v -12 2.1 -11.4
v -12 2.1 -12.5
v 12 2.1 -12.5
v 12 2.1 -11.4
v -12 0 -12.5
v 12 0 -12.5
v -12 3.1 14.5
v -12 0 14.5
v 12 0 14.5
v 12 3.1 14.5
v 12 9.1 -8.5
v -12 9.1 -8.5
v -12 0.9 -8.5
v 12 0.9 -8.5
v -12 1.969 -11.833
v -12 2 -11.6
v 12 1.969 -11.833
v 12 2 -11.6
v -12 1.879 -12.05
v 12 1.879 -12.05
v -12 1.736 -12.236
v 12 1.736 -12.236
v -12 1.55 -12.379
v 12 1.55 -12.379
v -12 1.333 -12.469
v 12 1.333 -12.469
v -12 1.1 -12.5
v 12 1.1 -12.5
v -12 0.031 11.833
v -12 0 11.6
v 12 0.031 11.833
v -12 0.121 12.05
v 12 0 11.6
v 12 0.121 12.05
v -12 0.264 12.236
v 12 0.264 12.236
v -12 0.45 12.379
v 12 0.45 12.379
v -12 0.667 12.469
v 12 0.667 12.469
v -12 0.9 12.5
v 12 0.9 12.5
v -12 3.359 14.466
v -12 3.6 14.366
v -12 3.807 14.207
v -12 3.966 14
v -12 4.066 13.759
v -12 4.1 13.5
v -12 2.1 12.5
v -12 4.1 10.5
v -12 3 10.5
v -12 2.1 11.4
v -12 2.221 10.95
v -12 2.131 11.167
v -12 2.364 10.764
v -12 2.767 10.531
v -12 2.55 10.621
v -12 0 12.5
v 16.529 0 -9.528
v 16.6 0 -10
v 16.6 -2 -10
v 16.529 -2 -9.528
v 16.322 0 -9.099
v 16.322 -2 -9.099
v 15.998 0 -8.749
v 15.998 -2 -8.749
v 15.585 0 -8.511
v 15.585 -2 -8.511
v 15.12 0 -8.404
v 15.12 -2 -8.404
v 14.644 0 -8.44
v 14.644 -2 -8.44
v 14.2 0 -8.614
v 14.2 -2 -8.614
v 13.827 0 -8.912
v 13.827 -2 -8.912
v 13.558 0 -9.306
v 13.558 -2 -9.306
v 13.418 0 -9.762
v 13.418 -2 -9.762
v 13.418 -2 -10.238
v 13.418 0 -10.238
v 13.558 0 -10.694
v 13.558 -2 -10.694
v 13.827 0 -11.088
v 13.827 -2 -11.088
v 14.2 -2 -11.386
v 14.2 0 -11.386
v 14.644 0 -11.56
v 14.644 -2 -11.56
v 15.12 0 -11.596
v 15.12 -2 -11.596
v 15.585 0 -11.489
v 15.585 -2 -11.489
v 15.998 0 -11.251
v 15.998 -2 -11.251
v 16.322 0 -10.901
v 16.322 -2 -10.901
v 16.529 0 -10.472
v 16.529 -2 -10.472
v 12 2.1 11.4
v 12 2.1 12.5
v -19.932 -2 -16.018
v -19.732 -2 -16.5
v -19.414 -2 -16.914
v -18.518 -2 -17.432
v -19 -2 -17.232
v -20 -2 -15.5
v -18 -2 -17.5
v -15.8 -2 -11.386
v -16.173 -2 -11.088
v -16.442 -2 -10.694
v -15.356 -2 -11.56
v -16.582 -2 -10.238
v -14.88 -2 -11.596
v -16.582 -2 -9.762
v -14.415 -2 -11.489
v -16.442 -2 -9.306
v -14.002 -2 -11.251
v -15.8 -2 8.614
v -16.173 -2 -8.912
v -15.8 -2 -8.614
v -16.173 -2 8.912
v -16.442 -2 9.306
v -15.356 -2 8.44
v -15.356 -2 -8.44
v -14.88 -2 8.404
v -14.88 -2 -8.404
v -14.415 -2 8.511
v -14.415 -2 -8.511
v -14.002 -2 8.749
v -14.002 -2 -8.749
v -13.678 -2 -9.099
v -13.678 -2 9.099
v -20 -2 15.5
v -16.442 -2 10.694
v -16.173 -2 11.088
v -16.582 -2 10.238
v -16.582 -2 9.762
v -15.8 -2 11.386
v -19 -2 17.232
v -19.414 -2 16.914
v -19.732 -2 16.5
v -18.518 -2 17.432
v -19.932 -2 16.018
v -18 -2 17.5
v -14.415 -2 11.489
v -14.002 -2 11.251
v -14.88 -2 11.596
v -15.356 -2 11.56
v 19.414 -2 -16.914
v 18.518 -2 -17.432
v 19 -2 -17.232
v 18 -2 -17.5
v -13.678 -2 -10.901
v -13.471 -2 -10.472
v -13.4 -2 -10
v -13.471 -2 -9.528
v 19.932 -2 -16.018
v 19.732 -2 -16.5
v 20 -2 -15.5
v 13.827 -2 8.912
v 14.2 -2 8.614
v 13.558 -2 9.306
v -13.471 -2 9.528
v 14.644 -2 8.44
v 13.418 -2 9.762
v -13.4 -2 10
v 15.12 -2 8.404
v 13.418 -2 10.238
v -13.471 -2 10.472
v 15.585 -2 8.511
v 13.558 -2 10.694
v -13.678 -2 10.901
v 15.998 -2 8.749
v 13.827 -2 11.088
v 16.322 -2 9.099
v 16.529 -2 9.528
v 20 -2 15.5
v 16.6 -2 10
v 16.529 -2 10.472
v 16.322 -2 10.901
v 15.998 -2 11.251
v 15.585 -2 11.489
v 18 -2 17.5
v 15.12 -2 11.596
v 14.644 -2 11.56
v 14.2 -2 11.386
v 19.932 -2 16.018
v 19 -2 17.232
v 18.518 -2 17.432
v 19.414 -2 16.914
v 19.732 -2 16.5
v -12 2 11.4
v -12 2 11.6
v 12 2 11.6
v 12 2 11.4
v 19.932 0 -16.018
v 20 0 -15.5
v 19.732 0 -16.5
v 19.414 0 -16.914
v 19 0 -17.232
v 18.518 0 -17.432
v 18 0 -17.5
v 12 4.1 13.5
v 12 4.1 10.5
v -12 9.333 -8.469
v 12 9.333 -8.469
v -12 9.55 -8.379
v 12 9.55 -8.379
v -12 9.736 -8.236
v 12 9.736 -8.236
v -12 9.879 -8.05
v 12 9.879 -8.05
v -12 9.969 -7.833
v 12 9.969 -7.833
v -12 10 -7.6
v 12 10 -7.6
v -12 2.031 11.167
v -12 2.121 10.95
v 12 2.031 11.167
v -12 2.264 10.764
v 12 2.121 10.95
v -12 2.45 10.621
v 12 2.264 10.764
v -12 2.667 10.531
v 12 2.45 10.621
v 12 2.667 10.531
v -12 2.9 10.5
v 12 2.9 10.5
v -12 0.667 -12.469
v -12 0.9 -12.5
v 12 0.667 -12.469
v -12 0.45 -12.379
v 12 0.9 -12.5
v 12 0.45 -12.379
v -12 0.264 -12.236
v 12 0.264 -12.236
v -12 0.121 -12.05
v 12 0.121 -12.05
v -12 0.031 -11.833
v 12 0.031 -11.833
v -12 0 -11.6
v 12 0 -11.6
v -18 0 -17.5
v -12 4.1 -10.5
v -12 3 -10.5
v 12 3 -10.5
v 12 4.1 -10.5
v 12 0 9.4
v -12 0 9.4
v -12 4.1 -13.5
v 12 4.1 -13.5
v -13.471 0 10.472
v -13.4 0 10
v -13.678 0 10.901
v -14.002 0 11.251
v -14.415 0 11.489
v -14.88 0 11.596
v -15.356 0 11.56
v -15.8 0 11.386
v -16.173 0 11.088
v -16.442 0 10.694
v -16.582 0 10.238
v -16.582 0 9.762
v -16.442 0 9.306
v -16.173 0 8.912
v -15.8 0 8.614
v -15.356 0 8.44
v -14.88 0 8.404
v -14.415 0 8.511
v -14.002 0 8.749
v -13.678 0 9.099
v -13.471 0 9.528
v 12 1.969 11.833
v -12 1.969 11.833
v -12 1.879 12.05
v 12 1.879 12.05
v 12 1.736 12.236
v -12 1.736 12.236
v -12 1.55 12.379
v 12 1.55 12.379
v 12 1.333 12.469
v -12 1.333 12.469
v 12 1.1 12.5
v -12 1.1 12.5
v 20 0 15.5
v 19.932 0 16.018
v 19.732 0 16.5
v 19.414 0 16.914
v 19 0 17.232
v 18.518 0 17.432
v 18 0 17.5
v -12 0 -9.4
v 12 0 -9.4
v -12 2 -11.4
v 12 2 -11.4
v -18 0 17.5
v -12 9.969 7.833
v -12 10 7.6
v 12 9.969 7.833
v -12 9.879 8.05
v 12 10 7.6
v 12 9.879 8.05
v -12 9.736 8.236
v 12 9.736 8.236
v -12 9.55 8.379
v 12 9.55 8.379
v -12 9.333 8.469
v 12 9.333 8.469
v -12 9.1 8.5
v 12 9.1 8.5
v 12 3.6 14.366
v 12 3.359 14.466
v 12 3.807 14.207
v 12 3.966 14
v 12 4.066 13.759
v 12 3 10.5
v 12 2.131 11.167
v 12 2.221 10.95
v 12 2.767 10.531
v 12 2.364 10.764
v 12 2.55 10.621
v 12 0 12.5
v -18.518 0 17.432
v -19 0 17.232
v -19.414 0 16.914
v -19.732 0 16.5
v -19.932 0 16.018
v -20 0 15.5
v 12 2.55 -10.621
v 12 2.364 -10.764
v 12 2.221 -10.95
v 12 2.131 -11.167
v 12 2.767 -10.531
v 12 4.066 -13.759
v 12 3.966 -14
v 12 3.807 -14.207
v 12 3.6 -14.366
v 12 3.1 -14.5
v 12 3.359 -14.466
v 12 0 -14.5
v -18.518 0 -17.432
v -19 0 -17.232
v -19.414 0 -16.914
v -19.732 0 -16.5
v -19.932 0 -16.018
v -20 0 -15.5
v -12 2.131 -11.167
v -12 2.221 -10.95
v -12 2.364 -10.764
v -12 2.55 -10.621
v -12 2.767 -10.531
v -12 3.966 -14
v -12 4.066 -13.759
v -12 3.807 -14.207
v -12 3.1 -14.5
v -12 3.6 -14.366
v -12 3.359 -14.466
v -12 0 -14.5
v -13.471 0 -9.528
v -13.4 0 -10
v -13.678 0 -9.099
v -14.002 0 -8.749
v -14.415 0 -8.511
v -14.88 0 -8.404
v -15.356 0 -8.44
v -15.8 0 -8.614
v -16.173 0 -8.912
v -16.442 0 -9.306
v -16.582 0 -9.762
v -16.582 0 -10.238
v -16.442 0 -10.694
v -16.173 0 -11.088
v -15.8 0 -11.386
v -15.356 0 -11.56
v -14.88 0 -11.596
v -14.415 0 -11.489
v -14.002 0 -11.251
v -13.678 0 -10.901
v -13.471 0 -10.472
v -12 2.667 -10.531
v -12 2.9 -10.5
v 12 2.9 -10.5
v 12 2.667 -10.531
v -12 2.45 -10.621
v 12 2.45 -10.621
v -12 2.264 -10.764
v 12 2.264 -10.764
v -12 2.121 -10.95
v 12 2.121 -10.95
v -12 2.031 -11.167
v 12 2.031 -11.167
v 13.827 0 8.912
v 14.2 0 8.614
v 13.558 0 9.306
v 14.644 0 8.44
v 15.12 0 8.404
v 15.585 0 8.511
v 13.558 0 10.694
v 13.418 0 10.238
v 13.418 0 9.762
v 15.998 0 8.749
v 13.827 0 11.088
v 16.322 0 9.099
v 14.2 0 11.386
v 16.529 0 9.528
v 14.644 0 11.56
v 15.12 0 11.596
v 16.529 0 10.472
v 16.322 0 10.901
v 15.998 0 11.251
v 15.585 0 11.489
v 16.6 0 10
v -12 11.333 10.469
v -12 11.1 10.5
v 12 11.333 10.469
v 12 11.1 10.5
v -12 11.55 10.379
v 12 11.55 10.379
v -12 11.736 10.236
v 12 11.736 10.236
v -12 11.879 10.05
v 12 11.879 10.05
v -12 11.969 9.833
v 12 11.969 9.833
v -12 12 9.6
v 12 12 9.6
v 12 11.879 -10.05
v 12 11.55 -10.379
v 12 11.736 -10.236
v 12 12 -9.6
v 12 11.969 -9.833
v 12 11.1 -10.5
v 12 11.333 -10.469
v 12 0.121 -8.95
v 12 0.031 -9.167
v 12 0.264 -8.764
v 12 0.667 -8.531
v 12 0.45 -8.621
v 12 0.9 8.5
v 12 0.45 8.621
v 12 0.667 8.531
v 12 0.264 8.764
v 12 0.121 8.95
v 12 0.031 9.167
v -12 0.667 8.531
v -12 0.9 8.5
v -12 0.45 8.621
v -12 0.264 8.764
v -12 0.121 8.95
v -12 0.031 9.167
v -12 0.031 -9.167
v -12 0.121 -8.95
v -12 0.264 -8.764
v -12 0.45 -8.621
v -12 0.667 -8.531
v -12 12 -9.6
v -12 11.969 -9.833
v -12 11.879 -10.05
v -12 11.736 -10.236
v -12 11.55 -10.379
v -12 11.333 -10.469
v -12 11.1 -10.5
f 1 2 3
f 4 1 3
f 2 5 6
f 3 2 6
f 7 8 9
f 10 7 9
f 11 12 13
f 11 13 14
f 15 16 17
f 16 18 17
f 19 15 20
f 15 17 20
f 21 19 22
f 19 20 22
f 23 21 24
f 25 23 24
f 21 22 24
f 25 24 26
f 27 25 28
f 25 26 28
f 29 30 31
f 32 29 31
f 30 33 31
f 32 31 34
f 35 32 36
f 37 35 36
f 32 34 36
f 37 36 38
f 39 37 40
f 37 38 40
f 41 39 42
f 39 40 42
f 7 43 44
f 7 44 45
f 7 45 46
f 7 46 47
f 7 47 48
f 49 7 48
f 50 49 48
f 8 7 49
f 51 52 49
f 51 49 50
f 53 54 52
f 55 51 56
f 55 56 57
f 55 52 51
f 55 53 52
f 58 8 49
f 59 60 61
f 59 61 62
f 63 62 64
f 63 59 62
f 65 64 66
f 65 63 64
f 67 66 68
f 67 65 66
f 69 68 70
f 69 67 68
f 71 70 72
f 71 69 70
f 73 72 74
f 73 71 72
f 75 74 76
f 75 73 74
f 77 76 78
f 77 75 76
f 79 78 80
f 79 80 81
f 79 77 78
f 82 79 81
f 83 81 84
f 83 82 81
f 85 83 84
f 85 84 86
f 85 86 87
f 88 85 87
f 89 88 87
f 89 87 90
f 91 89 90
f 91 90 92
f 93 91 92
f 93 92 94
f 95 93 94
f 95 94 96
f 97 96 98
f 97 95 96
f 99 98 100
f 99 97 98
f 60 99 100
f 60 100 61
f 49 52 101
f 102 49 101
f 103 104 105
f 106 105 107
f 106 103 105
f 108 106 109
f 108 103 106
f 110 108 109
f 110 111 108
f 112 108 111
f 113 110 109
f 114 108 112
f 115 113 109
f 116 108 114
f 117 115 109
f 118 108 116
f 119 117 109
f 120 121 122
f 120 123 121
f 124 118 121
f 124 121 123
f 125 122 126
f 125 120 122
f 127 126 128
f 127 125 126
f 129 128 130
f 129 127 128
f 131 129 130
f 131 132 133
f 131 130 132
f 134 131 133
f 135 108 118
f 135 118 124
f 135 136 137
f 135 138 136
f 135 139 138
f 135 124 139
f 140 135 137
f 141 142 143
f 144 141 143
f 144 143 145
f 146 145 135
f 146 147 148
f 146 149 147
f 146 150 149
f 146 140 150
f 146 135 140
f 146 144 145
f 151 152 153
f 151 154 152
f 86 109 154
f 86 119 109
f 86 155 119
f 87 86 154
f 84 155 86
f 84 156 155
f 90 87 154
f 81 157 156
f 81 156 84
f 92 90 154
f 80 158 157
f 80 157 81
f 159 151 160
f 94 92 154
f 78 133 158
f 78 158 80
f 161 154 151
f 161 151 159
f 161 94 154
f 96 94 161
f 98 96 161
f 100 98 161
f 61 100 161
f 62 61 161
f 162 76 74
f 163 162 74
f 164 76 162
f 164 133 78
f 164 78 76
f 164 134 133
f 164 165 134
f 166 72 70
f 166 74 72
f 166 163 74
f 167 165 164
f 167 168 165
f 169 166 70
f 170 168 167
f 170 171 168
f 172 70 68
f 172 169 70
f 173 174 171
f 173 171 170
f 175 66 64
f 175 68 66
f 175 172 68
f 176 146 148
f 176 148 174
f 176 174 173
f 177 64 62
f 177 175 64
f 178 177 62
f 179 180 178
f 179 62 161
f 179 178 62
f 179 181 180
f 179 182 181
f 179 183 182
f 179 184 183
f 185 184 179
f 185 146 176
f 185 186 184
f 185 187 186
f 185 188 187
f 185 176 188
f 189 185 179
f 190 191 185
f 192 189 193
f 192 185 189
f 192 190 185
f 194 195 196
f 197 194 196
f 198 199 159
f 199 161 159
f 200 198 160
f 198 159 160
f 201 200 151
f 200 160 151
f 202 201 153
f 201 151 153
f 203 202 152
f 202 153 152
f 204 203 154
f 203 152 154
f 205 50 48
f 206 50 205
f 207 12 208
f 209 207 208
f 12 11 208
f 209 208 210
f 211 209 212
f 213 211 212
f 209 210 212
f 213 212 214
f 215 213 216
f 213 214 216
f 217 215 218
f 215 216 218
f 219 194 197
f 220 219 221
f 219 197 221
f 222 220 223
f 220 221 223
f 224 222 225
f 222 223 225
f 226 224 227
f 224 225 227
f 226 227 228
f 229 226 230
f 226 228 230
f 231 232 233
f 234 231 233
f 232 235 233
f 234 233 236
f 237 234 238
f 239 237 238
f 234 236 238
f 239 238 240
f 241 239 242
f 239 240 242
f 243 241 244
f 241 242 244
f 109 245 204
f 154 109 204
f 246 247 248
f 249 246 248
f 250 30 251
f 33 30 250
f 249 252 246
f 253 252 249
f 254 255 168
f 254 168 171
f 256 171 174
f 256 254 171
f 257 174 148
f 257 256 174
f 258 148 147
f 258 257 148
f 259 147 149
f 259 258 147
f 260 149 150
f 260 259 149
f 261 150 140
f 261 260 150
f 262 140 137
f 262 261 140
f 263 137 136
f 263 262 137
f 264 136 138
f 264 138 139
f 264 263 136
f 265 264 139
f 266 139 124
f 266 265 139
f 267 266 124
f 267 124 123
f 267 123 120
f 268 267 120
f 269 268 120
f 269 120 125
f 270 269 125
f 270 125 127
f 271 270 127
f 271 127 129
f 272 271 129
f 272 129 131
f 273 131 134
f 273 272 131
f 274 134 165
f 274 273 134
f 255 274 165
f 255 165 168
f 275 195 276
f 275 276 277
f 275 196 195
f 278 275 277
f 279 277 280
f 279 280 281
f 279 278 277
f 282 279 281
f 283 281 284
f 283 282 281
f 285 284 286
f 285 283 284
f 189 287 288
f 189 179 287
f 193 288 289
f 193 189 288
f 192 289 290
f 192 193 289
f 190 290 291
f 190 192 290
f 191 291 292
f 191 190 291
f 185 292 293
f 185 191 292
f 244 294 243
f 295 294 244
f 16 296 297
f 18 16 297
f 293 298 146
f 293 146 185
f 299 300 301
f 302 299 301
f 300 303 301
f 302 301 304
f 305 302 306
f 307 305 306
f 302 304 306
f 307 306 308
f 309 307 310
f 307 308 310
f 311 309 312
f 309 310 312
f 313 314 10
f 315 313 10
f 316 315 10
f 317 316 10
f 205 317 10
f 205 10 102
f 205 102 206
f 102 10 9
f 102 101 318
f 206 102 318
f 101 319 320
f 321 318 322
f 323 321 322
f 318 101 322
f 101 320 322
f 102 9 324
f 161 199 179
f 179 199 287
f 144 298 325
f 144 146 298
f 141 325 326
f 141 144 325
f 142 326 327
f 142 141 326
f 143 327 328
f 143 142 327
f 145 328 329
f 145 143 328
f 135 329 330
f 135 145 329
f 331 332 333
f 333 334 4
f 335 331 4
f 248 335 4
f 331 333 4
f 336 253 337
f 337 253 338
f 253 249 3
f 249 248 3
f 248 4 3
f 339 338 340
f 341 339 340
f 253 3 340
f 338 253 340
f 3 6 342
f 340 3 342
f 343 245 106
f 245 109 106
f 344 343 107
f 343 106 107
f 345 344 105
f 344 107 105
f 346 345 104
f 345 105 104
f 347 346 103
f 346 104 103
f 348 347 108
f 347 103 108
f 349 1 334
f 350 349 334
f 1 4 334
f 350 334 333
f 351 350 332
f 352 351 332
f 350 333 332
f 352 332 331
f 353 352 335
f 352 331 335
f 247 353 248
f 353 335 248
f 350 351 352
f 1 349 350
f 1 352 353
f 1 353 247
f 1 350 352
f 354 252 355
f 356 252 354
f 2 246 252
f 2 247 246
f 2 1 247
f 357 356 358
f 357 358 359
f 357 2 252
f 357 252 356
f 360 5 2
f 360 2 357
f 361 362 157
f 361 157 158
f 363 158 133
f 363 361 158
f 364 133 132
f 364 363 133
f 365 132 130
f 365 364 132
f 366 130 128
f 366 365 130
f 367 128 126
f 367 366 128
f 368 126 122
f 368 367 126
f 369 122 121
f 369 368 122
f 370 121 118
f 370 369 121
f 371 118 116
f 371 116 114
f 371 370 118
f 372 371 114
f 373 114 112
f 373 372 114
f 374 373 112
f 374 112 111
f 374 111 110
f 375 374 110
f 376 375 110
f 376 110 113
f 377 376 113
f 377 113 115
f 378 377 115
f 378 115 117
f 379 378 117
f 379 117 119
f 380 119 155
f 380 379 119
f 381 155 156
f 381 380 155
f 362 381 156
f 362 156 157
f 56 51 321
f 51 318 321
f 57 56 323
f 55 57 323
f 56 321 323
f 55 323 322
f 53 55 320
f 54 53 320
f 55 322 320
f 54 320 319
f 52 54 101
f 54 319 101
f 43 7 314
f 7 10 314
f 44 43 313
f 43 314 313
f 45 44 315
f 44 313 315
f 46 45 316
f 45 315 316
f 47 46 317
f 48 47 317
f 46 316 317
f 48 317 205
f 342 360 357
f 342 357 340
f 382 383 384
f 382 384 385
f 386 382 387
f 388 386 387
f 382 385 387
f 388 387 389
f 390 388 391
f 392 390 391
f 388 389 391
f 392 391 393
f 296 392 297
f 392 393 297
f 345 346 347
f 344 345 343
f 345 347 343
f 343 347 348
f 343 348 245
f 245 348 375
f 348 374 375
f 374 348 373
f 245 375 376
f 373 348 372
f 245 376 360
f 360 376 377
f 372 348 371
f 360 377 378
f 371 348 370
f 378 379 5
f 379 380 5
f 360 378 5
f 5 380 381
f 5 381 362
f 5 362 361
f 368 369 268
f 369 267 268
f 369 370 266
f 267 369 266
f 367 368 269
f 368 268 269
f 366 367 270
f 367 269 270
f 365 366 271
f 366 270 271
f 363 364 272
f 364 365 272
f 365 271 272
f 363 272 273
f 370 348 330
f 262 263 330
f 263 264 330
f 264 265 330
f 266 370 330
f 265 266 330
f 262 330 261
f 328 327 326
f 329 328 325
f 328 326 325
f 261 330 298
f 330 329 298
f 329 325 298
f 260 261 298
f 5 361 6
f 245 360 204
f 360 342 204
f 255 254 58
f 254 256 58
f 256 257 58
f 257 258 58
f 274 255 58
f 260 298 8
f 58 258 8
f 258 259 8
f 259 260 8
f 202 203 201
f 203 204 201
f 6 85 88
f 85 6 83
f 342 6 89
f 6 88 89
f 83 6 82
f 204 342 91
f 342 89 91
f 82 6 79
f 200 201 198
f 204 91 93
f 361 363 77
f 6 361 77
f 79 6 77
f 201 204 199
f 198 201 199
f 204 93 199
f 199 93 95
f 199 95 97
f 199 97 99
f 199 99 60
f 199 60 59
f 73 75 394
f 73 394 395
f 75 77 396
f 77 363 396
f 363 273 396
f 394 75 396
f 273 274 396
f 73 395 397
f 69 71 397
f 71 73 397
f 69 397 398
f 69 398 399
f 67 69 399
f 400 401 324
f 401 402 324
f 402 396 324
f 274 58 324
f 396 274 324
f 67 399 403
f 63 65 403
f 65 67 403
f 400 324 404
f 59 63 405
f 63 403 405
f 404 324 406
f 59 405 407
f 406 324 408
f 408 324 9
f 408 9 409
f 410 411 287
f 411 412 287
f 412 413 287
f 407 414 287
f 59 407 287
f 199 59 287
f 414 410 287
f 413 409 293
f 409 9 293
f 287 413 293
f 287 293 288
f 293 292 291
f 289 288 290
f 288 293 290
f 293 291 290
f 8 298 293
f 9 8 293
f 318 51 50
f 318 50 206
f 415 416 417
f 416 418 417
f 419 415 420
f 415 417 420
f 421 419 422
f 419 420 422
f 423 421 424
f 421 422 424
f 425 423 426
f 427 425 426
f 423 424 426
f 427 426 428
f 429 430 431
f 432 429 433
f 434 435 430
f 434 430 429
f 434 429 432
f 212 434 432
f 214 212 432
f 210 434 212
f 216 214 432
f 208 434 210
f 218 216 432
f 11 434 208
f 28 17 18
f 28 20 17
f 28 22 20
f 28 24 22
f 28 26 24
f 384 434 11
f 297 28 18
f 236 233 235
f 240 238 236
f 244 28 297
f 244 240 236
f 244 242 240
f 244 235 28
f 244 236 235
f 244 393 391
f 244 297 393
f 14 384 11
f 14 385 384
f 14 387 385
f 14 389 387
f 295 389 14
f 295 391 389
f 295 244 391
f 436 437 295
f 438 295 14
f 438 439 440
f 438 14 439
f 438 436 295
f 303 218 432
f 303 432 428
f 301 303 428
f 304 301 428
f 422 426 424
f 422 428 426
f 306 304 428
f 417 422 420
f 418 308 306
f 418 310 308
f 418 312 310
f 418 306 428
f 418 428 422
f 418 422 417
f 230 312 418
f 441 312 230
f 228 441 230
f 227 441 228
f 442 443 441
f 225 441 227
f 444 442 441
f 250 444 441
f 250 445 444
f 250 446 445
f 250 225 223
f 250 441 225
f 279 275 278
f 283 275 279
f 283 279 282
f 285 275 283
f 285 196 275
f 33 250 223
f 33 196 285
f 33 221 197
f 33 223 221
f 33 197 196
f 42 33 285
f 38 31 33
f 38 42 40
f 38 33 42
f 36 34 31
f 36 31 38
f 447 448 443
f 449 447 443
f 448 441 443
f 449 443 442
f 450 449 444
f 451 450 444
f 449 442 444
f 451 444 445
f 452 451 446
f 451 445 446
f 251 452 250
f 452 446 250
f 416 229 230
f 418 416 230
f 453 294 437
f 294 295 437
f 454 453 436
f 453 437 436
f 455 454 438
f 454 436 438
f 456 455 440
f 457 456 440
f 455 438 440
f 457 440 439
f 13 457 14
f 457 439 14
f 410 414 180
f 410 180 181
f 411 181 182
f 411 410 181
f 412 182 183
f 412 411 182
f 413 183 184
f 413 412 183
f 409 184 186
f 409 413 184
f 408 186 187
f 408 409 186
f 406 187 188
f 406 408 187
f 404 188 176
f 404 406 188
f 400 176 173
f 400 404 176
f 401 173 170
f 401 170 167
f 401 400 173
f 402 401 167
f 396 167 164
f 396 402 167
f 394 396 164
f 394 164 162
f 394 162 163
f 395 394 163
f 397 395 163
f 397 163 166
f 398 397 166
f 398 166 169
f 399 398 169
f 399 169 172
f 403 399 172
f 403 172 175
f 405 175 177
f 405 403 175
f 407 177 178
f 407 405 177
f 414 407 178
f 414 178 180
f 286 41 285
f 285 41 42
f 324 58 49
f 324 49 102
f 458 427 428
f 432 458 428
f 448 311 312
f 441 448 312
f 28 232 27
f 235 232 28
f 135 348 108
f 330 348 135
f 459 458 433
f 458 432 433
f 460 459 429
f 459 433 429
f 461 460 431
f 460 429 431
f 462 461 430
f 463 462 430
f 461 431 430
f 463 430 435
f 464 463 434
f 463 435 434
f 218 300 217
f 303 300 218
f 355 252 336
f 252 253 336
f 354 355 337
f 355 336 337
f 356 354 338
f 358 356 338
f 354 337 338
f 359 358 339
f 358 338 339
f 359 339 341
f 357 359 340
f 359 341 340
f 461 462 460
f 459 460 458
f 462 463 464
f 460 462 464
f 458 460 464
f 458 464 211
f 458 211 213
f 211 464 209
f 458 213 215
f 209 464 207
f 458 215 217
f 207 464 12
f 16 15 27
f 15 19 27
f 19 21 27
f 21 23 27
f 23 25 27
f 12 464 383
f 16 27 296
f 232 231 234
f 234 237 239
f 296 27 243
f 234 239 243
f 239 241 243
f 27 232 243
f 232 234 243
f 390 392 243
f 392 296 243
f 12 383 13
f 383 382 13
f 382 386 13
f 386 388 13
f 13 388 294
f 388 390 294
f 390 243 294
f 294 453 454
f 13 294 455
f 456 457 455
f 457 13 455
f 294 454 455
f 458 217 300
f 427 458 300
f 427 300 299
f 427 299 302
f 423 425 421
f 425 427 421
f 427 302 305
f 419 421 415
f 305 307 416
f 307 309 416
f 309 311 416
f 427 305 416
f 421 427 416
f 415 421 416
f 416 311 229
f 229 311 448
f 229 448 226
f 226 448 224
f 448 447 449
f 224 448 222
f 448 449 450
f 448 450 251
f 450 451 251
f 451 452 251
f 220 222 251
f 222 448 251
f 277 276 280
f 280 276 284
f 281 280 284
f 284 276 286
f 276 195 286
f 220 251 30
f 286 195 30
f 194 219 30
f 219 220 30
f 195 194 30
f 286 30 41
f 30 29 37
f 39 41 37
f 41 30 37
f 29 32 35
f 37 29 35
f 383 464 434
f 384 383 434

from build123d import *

# Parameters (mm, degrees)
SKETCH_W     = 40
SKETCH_H     = 35
SKETCH_R     = 1.6
PAD_DEPTH    = 2
SKETCH004_W  = 24
SKETCH004_H  = 2
PAD003_DEPTH = 2.1
SKETCH005_W  = 24
SKETCH005_H  = 4
PAD005_DEPTH = 2
FILLET_R     = 2
FILLET002_R  = 0.9
FILLET003_R  = 1
SKETCH001_W  = 24
SKETCH001_H  = 21
PAD001_DEPTH = 2
SKETCH002_W  = 24
SKETCH002_H  = 2
PAD002_DEPTH = 10
SKETCH003_W  = 24
SKETCH003_H  = 2
PAD004_DEPTH = 2
FILLET001_R  = 0.9


with BuildPart() as base:
    # Sketch → Pad (new body)
    with BuildSketch(Plane.XZ):
        Rectangle(SKETCH_W, SKETCH_H)
        with Locations((-15, 10)):
            Circle(SKETCH_R, mode=Mode.SUBTRACT)
        with Locations((15, 10)):
            Circle(SKETCH_R, mode=Mode.SUBTRACT)
        with Locations((15, -10)):
            Circle(SKETCH_R, mode=Mode.SUBTRACT)
        with Locations((-15, -10)):
            Circle(SKETCH_R, mode=Mode.SUBTRACT)
    extrude(amount=PAD_DEPTH)

    # Sketch004 (on Face9 of Pad) → Pad003 (join)
    with BuildSketch(Plane(origin=(0, 0, 0), x_dir=(1, 0, 0), z_dir=(0, 1, 0))):
        with Locations((0, 13.5)):
            Rectangle(SKETCH004_W, SKETCH004_H)
        with Locations((0, -13.5)):
            Rectangle(SKETCH004_W, SKETCH004_H)
    extrude(amount=PAD003_DEPTH)

    # Sketch005 (on Face20 of Pad003) → Pad005 (join)
    with BuildSketch(Plane(origin=(0, 2.1, 0), x_dir=(1, 0, 0), z_dir=(0, 1, 0))):
        with Locations((0, -12.5)):
            Rectangle(SKETCH005_W, SKETCH005_H)
        with Locations((0, 12.5)):
            Rectangle(SKETCH005_W, SKETCH005_H)
    extrude(amount=PAD005_DEPTH)

    # Fillet
    fillet_edges = [base.edges().sort_by_distance(p)[0] for p in [
        (-20, -1, 17.5),
        (-20, -1, -17.5),
        (20, -1, -17.5),
        (20, -1, 17.5),
    ]]
    fillet(fillet_edges, radius=FILLET_R)

    # Fillet002
    fillet002_edges = [base.edges().sort_by_distance(p)[0] for p in [
        (0, 2.1, -10.5),
        (0, 2.1, 10.5),
    ]]
    fillet(fillet002_edges, radius=FILLET002_R)

    # Fillet003
    fillet003_edges = [base.edges().sort_by_distance(p)[0] for p in [
        (0, 4.1, -14.5),
        (0, 4.1, 14.5),
    ]]
    fillet(fillet003_edges, radius=FILLET003_R)


with BuildPart() as cap:
    # Sketch001 (on DatumPlane) → Pad001 (new body)
    with BuildSketch(Plane.XZ.offset(-10)):
        Rectangle(SKETCH001_W, SKETCH001_H)
    extrude(amount=-PAD001_DEPTH)

    # Sketch002 (on Face5 of Pad001) → Pad002 (join)
    with BuildSketch(Plane.XZ.offset(-10)):
        with Locations((0, -9.5)):
            Rectangle(SKETCH002_W, SKETCH002_H)
        with Locations((0, 9.5)):
            Rectangle(SKETCH002_W, SKETCH002_H)
    extrude(amount=PAD002_DEPTH)

    # Sketch003 (on Face15 of Pad002) → Pad004 (join)
    with BuildSketch(Plane.XZ):
        with Locations((0, 11.5)):
            Rectangle(SKETCH003_W, SKETCH003_H)
        with Locations((0, -11.5)):
            Rectangle(SKETCH003_W, SKETCH003_H)
    extrude(amount=-PAD004_DEPTH)

    # Fillet001
    fillet001_edges = [cap.edges().sort_by_distance(p)[0] for p in [
        (0, 0, -8.5),
        (0, 0, 8.5),
        (0, 10, 8.5),
        (0, 10, -8.5),
        (0, 12, -10.5),
        (0, 12, 10.5),
        (0, 2, 10.5),
        (0, 2, -10.5),
        (0, 2, -12.5),
        (0, 0, -12.5),
        (0, 2, 12.5),
        (0, 0, 12.5),
    ]]
    fillet(fillet001_edges, radius=FILLET001_R)


solid = Compound([base.part, cap.part])
